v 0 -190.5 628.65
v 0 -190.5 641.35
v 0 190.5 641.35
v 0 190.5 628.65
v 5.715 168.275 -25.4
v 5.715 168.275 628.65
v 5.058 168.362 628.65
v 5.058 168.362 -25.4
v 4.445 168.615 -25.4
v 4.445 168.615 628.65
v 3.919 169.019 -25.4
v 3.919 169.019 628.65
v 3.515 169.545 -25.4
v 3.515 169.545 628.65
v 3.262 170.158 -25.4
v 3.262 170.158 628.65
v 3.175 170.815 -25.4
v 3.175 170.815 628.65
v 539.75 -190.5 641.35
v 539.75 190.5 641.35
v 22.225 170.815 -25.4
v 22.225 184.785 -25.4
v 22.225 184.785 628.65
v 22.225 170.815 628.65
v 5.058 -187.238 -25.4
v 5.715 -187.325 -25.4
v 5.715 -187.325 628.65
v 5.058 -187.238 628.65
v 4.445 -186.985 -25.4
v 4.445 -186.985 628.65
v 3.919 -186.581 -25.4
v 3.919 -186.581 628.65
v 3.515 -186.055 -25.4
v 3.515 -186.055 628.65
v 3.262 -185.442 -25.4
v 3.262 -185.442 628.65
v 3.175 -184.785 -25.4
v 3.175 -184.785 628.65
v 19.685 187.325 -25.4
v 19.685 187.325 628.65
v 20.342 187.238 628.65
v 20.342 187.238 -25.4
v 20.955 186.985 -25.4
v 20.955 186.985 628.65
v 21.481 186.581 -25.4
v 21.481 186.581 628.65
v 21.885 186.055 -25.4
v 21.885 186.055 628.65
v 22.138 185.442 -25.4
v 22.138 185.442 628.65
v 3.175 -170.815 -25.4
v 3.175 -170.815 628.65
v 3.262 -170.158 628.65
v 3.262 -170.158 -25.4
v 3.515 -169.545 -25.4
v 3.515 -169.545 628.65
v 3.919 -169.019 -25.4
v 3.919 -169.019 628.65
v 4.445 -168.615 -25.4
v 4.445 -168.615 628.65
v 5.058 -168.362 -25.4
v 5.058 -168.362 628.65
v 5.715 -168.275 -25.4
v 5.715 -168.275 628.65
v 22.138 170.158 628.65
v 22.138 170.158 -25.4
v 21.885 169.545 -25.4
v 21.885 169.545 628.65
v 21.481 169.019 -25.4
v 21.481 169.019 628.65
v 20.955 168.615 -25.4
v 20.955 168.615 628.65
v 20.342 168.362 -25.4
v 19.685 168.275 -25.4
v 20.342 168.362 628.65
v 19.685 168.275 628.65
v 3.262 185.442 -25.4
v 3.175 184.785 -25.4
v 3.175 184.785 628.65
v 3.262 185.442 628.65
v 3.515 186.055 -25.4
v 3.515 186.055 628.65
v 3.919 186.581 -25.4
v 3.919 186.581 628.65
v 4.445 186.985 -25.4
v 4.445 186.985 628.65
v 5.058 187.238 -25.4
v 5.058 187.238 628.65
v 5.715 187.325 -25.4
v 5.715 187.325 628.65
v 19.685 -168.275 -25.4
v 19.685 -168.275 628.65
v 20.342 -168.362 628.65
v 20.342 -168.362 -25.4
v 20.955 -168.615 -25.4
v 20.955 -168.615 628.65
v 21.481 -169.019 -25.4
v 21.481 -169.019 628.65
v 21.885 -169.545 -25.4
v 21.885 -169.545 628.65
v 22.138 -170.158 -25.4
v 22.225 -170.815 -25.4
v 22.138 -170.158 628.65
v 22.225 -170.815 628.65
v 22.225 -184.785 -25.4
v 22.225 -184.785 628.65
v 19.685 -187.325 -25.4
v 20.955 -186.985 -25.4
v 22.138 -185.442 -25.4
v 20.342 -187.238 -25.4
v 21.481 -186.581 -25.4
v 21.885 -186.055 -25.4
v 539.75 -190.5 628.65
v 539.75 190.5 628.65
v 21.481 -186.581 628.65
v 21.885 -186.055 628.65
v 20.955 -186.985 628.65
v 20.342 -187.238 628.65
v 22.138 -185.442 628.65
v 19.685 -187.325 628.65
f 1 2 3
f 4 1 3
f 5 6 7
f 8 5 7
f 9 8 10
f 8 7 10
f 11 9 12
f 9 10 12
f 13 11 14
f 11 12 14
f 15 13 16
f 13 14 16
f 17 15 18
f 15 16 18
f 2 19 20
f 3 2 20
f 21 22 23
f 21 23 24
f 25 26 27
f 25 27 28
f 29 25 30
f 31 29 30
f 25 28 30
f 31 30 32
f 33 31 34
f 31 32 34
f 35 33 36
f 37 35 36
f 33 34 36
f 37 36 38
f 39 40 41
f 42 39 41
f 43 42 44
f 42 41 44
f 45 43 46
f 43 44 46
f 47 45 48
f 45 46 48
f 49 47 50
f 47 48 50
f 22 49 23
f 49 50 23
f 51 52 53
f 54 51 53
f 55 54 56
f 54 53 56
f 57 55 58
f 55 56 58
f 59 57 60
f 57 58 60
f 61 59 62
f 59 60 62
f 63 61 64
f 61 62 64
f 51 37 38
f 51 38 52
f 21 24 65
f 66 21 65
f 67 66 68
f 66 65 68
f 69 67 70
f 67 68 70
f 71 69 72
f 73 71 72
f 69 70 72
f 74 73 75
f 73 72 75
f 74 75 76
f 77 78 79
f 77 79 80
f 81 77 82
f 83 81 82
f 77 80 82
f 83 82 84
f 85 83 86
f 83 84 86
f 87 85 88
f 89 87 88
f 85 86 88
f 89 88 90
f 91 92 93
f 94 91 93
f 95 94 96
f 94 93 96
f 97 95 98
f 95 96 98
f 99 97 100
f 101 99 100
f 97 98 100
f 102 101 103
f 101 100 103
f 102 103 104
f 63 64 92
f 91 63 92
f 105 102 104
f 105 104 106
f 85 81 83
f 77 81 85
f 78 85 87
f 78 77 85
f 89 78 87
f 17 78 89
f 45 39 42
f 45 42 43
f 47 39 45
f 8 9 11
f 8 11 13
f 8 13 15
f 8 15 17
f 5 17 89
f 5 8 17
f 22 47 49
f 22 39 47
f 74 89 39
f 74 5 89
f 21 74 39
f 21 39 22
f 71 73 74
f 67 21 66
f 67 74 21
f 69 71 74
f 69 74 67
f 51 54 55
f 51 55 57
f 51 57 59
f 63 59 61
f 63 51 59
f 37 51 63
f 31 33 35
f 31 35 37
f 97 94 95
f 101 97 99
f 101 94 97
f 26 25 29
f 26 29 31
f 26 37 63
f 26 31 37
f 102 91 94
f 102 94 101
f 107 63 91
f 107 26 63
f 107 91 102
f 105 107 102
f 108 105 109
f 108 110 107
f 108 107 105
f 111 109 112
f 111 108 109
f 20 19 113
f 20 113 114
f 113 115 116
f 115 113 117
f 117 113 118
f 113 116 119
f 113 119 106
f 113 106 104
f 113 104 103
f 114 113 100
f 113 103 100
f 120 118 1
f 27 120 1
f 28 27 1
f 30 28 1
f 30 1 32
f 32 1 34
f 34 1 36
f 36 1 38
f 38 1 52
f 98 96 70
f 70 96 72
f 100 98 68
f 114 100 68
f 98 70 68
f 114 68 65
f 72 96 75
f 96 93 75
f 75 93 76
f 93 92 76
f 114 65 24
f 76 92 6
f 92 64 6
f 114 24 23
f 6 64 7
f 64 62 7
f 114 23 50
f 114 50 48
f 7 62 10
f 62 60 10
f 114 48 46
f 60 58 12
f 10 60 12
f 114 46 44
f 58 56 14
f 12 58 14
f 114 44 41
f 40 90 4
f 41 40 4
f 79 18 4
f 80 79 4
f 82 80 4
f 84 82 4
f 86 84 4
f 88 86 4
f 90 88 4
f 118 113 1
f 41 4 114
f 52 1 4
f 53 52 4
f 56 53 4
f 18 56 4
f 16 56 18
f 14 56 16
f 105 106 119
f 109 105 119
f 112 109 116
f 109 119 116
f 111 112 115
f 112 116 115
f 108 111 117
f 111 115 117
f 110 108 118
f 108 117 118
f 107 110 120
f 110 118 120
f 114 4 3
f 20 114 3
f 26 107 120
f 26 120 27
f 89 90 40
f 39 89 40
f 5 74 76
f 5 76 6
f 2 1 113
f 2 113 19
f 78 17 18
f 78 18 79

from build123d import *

# Parameters (mm, degrees)
F0_W     = 381
F0_H     = 12.7
F1_DEPTH = 539.75
F3_DEPTH = 654.05


with BuildPart() as f1:
    # F0 (on Right) → F1 (new body)
    with BuildSketch(Plane.YZ):
        with Locations((0, 635)):
            Rectangle(F0_W, F0_H)
    extrude(amount=F1_DEPTH)

    # F2 (on face) → F3 (join)
    with BuildSketch(Plane(origin=(0, 0, 628.65), x_dir=(1, 0, 0), z_dir=(0, 0, -1))):
        with BuildLine():
            Line((19.685, 187.325), (5.715, 187.325))
            ThreePointArc((5.715, 187.325), (3.918949, 186.581051), (3.175, 184.785))
            Line((3.175, 184.785), (3.175, 170.815))
            ThreePointArc((3.175, 170.815), (3.918949, 169.018949), (5.715, 168.275))
            Line((5.715, 168.275), (19.685, 168.275))
            ThreePointArc((19.685, 168.275), (21.481051, 169.018949), (22.225, 170.815))
            Line((22.225, 170.815), (22.225, 184.785))
            ThreePointArc((22.225, 184.785), (21.481051, 186.581051), (19.685, 187.325))
        make_face()
        with BuildLine():
            ThreePointArc((19.685, -187.325), (21.481051, -186.581051), (22.225, -184.785))
            Line((22.225, -184.785), (22.225, -170.815))
            ThreePointArc((22.225, -170.815), (21.481051, -169.018949), (19.685, -168.275))
            Line((19.685, -168.275), (5.715, -168.275))
            ThreePointArc((5.715, -168.275), (3.918949, -169.018949), (3.175, -170.815))
            Line((3.175, -170.815), (3.175, -184.785))
            ThreePointArc((3.175, -184.785), (3.918949, -186.581051), (5.715, -187.325))
            Line((5.715, -187.325), (19.685, -187.325))
        make_face()
    extrude(amount=F3_DEPTH)


solid = f1.part
